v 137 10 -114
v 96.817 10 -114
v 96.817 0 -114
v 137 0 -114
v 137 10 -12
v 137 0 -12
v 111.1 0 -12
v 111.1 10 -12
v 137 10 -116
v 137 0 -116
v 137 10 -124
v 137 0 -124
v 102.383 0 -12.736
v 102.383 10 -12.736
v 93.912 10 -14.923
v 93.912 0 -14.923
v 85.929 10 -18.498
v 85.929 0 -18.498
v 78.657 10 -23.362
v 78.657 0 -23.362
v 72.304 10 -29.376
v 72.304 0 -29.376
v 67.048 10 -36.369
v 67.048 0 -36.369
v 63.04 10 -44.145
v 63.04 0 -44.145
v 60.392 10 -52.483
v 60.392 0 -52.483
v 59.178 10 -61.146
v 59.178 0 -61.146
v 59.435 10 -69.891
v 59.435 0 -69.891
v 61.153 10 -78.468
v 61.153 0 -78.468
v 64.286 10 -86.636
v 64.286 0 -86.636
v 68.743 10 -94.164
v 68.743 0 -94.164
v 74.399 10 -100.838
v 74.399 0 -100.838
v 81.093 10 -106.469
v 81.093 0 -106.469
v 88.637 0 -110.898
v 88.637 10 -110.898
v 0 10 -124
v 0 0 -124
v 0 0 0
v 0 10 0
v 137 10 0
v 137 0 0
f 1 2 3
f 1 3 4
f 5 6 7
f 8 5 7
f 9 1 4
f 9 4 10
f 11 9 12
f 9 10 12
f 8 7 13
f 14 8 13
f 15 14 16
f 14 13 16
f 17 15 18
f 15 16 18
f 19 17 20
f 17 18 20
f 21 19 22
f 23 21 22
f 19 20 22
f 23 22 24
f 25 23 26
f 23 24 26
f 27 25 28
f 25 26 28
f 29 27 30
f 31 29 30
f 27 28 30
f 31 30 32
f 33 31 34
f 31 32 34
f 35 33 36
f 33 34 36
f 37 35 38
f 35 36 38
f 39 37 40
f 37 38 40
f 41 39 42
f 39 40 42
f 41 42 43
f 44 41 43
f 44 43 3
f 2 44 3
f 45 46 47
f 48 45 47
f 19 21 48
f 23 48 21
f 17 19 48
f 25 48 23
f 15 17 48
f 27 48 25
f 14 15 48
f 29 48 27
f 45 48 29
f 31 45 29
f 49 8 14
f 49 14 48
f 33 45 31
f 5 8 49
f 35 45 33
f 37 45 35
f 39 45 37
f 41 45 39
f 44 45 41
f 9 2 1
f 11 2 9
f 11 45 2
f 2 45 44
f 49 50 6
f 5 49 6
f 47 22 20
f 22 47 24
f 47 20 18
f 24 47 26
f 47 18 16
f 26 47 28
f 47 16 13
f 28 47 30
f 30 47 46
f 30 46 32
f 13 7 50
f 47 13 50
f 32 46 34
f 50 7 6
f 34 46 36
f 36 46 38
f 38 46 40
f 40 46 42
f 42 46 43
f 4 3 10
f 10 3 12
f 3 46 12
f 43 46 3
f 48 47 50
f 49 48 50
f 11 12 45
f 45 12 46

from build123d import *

# Parameters (mm, degrees)
BOSS_EXTRUDE1_DEPTH = 10
SKETCH2_W           = 40.182856857
SKETCH2_H           = 10
BOSS_EXTRUDE2_DEPTH = 10


with BuildPart() as part:
    # Sketch1 → Boss-Extrude1 (new body)
    with BuildSketch(Plane(origin=(0, 0, 0), x_dir=(1, 0, 0), z_dir=(0, 1, 0))):
        with BuildLine():
            Line((137, 124), (0, 124))
            Line((0, 124), (0, 0))
            Line((0, 0), (137, 0))
            Line((137, 0), (137, 12))
            Line((137, 12), (111.1, 12))
            ThreePointArc((111.1, 12), (59.1, 64), (111.1, 116))
            Line((111.1, 116), (137, 116))
            Line((137, 116), (137, 124))
        make_face()
    extrude(amount=BOSS_EXTRUDE1_DEPTH)

    # Sketch2 → Boss-Extrude2 (add)
    with BuildSketch(Plane(origin=(0, 10, 0), x_dir=(1, 0, 0), z_dir=(0, 1, 0))):
        with Locations((116.908571572, 119)):
            Rectangle(SKETCH2_W, SKETCH2_H)
    extrude(amount=-BOSS_EXTRUDE2_DEPTH)


solid = part.part
